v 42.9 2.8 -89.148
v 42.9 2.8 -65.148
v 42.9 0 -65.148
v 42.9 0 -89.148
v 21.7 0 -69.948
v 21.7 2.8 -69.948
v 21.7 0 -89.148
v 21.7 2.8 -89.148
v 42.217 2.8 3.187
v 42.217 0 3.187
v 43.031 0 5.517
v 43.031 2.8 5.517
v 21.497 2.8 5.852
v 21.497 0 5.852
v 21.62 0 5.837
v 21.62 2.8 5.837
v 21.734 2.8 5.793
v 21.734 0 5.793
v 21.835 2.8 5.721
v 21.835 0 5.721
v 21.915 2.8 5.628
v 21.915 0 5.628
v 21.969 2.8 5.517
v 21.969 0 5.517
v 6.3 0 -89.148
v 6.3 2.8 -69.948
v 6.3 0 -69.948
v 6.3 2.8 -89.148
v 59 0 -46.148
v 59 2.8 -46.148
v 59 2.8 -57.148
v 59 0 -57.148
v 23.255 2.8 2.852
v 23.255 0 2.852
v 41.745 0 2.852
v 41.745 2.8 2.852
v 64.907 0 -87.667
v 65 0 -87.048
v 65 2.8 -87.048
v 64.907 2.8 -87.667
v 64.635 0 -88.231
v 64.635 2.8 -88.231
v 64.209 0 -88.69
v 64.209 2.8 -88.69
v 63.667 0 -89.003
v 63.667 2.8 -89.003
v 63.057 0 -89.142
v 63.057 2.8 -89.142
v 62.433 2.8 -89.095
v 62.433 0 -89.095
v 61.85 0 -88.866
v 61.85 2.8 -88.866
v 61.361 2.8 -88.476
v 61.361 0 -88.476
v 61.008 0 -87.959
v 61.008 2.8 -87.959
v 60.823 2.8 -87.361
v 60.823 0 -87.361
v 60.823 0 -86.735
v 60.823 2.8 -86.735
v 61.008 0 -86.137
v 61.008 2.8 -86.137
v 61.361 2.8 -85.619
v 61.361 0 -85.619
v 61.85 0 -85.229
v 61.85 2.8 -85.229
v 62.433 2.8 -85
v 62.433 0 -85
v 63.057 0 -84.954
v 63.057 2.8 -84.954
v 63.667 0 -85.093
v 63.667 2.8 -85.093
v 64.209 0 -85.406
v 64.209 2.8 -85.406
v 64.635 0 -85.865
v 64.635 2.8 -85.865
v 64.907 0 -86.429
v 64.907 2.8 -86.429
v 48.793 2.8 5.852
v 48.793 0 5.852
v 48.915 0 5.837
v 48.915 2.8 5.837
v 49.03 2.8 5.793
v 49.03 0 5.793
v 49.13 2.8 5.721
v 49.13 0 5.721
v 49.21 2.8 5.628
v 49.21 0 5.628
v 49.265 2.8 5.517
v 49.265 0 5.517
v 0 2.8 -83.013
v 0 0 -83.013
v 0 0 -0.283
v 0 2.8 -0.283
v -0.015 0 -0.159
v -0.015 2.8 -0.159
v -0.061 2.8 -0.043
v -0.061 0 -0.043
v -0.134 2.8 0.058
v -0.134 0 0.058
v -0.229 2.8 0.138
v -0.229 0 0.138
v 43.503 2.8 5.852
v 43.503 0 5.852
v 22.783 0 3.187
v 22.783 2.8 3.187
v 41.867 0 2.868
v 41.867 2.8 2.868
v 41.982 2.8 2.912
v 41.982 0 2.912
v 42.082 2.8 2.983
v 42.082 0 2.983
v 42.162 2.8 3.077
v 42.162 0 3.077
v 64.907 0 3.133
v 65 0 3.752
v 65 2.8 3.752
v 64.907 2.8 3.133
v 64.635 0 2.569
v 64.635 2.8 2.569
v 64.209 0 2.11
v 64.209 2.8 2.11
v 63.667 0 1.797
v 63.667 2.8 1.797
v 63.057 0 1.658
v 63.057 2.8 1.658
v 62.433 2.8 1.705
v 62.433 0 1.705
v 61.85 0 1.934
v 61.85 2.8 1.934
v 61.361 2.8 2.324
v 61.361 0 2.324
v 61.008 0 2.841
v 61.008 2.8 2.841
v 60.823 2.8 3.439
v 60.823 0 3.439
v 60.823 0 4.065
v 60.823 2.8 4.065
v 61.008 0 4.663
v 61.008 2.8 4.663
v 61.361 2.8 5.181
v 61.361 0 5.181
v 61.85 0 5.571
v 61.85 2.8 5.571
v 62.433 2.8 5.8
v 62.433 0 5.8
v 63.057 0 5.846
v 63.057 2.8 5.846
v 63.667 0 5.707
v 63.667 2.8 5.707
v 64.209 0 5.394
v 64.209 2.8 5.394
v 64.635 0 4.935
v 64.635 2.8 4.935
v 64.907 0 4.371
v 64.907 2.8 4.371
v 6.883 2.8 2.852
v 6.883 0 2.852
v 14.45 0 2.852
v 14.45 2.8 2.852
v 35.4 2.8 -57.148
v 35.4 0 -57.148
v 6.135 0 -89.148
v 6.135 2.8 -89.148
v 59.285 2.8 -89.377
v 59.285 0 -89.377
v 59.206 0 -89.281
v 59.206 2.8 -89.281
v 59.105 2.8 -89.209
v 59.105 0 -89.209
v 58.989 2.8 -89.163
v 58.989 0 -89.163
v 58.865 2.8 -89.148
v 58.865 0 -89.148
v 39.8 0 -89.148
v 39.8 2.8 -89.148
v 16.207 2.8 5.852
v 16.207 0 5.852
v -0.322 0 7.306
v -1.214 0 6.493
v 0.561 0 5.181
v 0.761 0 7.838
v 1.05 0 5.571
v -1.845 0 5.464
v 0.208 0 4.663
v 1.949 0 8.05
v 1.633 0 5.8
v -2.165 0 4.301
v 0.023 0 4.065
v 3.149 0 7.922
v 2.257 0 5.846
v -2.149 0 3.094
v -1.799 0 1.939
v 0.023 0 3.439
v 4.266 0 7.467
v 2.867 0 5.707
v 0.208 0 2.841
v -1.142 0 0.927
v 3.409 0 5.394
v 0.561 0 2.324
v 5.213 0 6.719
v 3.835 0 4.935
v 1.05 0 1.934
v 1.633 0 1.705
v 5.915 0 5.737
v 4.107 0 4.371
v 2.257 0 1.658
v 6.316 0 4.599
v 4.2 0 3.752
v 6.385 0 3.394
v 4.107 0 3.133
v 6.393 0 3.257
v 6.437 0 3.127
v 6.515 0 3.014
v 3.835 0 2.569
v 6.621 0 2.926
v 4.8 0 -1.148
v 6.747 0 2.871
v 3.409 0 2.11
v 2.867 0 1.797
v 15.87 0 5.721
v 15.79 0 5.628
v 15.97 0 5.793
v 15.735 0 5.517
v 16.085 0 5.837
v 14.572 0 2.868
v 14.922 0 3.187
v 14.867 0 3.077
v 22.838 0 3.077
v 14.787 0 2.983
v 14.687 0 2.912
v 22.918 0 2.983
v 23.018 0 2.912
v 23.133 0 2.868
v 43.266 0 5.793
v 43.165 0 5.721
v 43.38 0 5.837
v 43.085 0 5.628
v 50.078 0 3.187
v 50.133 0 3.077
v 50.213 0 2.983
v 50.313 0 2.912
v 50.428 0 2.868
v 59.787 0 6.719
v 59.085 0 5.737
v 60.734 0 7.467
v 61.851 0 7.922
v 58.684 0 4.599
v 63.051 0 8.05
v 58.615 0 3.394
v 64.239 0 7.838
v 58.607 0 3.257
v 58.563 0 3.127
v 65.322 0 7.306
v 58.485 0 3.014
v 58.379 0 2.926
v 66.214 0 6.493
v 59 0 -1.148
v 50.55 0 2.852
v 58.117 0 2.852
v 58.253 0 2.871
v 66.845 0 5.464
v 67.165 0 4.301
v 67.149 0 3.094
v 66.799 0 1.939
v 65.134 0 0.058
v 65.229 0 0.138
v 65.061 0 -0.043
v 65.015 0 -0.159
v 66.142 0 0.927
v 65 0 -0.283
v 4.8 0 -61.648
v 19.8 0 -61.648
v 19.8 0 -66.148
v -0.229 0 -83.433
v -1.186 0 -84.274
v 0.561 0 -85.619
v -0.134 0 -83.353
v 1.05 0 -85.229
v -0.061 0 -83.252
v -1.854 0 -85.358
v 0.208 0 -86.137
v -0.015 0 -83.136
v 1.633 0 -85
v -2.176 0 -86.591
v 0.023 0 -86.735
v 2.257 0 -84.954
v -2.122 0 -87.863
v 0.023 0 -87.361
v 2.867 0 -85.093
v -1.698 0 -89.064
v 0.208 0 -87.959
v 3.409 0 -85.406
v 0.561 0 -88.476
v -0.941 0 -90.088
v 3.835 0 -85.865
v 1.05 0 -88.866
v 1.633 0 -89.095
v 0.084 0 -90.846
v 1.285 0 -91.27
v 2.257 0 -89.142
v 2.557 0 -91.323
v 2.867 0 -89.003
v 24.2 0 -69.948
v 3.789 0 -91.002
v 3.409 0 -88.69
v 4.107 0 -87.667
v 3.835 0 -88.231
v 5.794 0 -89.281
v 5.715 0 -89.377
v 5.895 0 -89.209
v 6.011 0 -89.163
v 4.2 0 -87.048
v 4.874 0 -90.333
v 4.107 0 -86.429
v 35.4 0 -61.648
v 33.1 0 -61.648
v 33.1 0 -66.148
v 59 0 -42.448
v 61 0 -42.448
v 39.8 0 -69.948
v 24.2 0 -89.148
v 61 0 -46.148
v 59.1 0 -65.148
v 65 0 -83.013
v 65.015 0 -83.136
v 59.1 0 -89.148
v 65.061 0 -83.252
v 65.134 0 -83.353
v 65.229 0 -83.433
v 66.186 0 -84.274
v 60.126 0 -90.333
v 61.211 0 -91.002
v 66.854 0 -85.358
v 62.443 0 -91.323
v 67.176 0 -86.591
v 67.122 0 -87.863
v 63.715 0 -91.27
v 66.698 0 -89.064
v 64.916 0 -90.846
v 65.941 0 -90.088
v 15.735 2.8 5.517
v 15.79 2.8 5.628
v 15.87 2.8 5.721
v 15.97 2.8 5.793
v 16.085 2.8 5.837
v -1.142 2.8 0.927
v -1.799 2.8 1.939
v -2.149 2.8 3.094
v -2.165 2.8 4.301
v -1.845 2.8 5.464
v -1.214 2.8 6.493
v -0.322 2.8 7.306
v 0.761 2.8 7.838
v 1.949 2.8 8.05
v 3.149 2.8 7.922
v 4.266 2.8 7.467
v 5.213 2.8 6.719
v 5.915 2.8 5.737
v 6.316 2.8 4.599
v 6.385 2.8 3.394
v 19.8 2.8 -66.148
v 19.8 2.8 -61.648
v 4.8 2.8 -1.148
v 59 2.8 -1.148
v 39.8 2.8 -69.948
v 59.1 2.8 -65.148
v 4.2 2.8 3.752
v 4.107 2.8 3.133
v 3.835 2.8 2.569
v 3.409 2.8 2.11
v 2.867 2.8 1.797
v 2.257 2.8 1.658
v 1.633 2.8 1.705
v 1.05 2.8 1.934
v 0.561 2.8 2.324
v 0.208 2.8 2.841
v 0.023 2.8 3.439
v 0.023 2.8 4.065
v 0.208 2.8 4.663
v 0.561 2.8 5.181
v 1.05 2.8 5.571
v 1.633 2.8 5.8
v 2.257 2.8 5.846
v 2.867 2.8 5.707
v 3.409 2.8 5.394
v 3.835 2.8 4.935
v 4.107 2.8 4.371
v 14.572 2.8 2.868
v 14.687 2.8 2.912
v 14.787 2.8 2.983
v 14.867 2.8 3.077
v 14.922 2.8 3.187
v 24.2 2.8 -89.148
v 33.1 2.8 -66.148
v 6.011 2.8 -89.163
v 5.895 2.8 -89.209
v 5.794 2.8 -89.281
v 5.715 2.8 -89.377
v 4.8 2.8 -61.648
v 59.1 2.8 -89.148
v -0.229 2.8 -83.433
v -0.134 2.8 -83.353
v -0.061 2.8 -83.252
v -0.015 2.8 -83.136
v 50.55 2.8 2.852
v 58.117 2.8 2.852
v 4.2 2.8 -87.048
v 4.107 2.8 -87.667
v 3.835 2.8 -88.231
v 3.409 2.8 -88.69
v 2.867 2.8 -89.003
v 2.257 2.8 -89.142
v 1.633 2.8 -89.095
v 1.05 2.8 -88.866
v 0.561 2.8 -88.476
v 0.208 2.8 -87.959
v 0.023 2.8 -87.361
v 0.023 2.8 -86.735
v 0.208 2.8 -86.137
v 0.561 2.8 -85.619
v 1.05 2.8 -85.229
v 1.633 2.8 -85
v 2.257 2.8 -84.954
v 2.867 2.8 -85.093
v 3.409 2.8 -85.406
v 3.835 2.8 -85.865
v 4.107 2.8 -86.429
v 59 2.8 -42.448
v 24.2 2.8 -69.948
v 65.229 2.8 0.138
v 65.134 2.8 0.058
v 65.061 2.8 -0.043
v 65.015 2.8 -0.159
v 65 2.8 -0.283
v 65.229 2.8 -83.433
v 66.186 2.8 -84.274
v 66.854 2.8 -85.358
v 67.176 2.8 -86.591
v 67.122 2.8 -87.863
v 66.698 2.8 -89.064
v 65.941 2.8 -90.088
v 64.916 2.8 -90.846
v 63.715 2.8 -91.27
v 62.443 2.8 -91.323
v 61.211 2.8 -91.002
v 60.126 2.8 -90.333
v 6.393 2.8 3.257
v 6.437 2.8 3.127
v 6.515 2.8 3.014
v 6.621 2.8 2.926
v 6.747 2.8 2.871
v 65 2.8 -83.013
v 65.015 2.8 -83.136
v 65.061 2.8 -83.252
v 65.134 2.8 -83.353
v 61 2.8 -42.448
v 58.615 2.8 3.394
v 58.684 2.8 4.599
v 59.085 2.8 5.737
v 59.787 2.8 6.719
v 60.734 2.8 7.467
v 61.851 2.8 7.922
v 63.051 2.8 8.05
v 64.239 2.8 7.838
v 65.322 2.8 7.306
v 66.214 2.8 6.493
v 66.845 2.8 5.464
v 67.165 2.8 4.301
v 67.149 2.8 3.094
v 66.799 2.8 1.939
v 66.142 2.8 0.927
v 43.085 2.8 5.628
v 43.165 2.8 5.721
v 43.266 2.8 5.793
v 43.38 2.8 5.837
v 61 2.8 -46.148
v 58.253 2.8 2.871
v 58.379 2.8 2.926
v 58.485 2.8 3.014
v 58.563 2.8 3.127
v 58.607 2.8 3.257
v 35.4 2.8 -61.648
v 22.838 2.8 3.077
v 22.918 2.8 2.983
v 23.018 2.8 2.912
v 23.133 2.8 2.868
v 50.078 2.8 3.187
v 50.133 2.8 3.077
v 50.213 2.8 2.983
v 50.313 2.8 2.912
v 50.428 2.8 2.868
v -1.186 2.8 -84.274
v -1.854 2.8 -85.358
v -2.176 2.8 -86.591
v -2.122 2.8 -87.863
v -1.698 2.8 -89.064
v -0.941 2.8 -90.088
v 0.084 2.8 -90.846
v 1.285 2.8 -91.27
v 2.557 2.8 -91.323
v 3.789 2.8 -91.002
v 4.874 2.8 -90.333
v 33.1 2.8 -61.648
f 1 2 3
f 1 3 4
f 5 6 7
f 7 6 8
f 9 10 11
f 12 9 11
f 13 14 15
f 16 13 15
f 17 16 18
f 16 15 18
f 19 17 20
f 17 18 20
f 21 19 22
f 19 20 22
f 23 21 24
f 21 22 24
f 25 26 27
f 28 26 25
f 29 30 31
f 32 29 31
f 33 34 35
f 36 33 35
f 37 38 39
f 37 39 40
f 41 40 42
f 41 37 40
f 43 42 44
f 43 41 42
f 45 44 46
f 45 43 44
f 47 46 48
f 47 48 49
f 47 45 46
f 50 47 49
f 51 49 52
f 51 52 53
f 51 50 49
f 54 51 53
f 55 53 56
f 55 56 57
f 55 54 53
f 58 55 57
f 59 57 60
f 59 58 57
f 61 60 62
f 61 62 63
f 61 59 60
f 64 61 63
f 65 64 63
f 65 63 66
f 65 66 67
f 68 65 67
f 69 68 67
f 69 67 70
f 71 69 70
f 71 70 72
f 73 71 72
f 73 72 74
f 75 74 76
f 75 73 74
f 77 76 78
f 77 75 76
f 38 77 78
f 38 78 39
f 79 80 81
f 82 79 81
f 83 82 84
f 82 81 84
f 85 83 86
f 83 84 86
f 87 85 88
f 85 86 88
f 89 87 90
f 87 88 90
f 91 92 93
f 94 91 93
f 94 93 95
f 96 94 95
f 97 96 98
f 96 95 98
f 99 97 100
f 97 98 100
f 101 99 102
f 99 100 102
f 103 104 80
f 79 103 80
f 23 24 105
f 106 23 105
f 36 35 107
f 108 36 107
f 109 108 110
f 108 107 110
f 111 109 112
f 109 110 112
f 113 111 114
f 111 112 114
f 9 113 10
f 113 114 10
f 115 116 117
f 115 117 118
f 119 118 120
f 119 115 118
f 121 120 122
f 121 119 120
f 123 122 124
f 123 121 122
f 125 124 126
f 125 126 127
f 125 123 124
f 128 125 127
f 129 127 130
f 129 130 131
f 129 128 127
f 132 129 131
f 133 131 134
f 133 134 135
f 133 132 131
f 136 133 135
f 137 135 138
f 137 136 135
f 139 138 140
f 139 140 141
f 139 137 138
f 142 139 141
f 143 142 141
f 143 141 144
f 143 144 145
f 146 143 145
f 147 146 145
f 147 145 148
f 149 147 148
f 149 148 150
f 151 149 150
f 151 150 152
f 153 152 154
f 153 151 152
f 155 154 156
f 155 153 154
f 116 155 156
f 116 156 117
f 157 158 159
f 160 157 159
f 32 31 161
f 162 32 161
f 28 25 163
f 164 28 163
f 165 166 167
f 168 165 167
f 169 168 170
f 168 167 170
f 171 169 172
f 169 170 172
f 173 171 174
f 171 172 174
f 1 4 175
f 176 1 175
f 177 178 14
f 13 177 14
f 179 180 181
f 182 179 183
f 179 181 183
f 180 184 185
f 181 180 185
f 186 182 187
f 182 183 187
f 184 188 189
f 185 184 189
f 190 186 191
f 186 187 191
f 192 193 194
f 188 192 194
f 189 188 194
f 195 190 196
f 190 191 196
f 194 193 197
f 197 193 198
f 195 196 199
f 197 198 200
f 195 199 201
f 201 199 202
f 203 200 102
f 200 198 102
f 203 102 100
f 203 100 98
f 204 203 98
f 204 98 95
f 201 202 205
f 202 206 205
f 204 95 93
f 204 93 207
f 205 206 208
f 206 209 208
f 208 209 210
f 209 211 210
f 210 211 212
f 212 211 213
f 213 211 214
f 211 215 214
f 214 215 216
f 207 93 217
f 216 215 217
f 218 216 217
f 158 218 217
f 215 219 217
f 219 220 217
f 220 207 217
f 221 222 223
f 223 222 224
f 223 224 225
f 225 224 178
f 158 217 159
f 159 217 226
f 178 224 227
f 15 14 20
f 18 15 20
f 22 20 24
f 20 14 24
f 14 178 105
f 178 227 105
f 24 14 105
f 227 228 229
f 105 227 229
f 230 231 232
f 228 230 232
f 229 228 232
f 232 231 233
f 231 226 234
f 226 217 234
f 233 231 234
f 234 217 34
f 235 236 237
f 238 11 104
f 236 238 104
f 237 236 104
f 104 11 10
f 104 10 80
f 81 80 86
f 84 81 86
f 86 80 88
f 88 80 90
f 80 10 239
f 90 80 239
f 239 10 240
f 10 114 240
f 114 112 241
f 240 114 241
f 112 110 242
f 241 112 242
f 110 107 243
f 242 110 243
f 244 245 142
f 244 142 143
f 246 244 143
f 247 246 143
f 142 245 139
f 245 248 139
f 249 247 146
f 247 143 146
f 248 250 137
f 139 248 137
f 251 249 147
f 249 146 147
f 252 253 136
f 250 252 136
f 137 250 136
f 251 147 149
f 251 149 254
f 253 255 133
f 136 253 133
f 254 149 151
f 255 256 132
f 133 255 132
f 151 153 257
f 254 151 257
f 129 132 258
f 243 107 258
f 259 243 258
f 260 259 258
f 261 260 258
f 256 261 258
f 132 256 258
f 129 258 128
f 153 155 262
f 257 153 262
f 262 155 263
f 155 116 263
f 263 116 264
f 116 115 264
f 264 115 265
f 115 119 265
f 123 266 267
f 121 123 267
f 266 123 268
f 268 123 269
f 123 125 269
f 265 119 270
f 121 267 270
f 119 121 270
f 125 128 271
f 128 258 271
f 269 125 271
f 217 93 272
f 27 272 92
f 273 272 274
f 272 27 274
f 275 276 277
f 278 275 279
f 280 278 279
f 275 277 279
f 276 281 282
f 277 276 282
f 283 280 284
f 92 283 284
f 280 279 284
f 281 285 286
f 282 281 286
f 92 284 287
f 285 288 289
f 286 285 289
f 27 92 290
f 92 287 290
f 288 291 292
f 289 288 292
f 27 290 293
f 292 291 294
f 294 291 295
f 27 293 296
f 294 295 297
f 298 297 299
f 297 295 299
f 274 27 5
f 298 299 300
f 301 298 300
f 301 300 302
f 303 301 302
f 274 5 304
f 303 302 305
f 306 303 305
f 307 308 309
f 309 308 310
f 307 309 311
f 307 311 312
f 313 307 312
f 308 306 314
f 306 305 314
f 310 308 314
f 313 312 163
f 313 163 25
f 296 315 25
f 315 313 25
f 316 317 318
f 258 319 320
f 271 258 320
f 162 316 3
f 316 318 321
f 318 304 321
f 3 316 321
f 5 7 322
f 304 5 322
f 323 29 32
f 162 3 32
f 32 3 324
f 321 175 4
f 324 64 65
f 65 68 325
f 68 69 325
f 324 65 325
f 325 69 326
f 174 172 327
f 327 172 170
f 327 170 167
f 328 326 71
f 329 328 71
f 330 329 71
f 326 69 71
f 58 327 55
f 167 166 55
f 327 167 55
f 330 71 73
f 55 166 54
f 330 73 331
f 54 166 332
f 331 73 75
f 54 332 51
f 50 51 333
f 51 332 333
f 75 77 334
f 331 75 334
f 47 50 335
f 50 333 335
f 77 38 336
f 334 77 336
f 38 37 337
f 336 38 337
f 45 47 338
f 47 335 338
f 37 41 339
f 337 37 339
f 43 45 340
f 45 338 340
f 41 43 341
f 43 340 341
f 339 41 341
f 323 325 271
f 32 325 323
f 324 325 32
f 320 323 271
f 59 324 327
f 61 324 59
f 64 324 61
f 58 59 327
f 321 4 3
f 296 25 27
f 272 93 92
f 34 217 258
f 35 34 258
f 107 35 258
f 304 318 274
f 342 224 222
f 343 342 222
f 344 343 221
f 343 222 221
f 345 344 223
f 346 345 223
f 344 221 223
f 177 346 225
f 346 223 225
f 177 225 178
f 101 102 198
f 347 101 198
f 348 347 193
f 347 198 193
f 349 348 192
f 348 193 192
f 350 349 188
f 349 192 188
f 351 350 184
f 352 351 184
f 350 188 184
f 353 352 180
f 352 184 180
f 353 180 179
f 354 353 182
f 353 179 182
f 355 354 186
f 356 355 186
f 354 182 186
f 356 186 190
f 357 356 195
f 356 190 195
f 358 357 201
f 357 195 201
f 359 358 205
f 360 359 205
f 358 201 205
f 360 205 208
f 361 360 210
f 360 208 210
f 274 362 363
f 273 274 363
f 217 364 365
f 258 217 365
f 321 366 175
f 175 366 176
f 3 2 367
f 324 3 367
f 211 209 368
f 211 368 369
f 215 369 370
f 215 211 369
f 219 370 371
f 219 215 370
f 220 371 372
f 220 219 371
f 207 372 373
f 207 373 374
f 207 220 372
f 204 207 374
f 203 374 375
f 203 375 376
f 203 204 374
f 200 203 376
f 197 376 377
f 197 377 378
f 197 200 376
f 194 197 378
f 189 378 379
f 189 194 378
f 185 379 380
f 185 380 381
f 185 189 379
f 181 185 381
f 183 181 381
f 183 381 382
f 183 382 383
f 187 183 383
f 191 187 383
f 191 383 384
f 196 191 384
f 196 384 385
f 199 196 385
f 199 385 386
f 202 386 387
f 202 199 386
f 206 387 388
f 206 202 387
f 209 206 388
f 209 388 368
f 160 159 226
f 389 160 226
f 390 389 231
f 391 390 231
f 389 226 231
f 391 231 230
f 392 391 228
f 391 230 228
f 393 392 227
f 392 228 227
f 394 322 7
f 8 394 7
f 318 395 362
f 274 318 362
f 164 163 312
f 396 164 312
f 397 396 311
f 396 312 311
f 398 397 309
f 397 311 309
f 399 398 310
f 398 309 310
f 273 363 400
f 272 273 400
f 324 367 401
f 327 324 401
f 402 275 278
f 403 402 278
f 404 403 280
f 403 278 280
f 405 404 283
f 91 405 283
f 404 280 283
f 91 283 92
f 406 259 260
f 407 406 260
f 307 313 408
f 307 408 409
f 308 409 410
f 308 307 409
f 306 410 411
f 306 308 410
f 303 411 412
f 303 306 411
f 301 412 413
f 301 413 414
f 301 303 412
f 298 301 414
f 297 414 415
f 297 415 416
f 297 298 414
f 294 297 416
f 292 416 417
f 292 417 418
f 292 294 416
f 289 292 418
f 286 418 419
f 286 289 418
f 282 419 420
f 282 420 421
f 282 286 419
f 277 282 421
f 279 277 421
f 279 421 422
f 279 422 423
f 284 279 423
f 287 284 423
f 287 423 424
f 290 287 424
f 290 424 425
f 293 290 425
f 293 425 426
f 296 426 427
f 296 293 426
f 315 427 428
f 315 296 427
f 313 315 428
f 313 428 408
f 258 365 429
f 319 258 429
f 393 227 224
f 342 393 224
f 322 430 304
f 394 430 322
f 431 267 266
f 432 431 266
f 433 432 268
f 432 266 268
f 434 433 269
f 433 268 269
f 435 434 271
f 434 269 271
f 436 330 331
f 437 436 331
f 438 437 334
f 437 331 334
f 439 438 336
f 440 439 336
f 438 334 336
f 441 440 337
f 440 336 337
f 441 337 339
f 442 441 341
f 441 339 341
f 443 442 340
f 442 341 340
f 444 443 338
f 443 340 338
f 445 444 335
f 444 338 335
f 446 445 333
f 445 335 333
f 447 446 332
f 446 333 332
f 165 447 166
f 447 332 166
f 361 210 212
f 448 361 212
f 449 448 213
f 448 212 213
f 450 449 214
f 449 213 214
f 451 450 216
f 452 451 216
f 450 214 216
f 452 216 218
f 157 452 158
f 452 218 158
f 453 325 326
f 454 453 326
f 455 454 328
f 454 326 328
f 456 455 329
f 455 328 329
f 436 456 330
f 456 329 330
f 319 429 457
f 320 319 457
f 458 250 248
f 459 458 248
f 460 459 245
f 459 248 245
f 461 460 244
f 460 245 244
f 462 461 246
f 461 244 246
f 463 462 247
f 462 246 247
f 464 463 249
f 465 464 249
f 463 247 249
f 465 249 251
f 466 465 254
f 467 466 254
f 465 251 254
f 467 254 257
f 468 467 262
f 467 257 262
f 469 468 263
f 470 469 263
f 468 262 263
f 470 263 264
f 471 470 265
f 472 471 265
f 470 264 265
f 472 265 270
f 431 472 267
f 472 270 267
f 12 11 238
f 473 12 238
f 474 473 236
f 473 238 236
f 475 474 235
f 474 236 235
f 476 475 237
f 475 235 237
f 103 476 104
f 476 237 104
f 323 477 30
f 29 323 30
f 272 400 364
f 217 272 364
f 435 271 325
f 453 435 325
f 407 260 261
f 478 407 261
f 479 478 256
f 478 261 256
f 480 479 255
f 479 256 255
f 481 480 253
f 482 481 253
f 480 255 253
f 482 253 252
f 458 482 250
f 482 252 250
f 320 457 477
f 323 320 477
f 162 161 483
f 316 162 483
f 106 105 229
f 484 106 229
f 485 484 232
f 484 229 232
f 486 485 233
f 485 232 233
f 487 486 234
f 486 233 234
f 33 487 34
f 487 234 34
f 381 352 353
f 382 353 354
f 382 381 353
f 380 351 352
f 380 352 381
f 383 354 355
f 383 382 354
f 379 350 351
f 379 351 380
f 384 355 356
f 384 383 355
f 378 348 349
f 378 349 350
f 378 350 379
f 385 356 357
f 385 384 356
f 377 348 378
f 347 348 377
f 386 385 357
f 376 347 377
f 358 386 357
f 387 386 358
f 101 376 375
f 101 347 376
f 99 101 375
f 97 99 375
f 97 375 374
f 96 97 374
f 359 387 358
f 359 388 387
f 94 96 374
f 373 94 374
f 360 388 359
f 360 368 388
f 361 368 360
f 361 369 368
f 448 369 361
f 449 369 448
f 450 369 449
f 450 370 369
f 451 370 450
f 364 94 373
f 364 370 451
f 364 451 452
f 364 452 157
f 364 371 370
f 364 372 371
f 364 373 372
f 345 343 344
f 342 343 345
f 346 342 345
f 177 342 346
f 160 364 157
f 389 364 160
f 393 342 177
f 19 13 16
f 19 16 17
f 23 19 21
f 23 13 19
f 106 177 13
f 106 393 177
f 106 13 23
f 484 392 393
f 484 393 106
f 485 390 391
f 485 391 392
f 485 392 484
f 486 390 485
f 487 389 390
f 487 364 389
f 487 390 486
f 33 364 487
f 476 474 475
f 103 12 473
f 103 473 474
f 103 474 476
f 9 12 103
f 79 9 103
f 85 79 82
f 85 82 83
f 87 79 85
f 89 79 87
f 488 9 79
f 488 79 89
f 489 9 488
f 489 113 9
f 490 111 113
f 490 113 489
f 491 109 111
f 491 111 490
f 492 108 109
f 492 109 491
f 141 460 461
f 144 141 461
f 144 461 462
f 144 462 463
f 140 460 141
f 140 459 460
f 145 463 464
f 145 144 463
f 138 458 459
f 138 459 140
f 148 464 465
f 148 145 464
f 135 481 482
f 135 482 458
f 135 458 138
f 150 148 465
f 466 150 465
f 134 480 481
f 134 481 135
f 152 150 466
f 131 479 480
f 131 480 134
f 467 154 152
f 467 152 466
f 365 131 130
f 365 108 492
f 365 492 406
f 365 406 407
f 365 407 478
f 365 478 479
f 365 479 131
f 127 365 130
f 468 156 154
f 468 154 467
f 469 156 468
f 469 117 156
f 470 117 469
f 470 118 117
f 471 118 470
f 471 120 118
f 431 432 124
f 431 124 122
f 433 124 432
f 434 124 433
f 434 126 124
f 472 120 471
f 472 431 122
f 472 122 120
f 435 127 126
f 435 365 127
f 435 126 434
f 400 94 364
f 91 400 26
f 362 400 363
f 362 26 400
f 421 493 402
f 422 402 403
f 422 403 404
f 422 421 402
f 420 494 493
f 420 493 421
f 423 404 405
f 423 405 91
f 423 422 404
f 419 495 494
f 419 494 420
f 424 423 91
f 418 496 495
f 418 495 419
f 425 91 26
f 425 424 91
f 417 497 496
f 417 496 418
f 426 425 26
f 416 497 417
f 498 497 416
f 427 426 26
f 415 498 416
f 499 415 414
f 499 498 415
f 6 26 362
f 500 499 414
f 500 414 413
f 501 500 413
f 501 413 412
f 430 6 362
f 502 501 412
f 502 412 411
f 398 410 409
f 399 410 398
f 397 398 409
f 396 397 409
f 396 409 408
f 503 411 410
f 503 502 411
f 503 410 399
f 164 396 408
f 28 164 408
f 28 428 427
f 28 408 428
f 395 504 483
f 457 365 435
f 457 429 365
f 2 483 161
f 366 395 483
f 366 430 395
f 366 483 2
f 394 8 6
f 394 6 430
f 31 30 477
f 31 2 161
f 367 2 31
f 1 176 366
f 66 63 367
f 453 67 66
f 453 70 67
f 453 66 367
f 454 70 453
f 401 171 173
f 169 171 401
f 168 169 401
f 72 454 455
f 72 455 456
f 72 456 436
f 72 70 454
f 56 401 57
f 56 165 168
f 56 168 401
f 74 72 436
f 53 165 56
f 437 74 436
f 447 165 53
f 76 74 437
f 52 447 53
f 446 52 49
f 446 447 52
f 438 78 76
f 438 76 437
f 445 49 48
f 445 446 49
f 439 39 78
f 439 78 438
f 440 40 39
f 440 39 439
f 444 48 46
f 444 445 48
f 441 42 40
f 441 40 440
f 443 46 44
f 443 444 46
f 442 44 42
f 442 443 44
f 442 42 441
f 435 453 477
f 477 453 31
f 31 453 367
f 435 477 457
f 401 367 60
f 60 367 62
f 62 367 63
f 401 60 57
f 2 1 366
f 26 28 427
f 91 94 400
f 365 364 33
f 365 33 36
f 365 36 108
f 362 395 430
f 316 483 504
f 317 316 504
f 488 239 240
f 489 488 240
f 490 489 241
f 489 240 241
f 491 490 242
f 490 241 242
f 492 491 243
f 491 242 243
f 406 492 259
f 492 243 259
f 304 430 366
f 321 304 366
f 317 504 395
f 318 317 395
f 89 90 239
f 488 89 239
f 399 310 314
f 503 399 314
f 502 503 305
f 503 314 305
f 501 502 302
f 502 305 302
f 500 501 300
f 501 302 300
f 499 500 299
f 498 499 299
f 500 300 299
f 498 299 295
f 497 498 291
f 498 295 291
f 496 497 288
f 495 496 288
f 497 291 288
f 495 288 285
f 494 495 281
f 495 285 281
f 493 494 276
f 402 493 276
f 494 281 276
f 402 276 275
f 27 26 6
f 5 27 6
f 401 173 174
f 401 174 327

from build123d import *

# Parameters (mm, degrees)
BASEPLATE_OUTLINE_R = 2.1
BASEPLATE_DEPTH     = 2.8
CUT_EXTRUDE1_REACH  = 115.438
SKETCH3_W           = 15.4
SKETCH3_H           = 19.2
SKETCH3_W_2         = 15.6
SKETCH3_W_3         = 16.2
SKETCH3_H_2         = 24


# Read off the part's stored shape, not the designer's step: BasePlate
with BuildPart() as part:
    # BasePlate outline → BasePlate (new body)
    with BuildSketch(Plane(origin=(0, 0, 0), x_dir=(1, 0, 0), z_dir=(0, 1, 0))):
        with BuildLine():
            Line((43.502626614, -5.852332608), (48.792614178, -5.852332608))
            ThreePointArc((48.792614178, -5.852332608), (49.082078508, -5.760021707), (49.264659986, -5.517174213))
            Line((49.264659986, -5.517174213), (50.078201202, -3.187491002))
            ThreePointArc((50.078201202, -3.187491002), (50.26078268, -2.944643509), (50.55024701, -2.852332608))
            Line((50.55024701, -2.852332608), (58.116695703, -2.852332608))
            ThreePointArc((58.116695703, -2.852332608), (58.484685739, -3.013831008), (58.614956567, -3.393999275))
            ThreePointArc((58.614956567, -3.393999275), (64.799237397, -7.61016844), (65.229166667, -0.137781095))
            ThreePointArc((65.229166667, -0.137781095), (65.061014427, 0.043158816), (65, 0.282515593))
            Line((65, 0.282515593), (65, 83.012819192))
            ThreePointArc((65, 83.012819192), (65.061014427, 83.252175969), (65.229166667, 83.433115879))
            ThreePointArc((65.229166667, 83.433115879), (65.940559159, 90.088226551), (59.285448487, 89.376834059))
            ThreePointArc((59.285448487, 89.376834059), (59.104508577, 89.208681819), (58.8651518, 89.147667392))
            Line((58.8651518, 89.147667392), (6.1348482, 89.147667392))
            ThreePointArc((6.1348482, 89.147667392), (5.895491423, 89.208681819), (5.714551513, 89.376834059))
            ThreePointArc((5.714551513, 89.376834059), (-0.940559159, 90.088226551), (-0.229166667, 83.433115879))
            ThreePointArc((-0.229166667, 83.433115879), (-0.061014427, 83.252175969), (0, 83.012819192))
            Line((0, 83.012819192), (0, 0.282515593))
            ThreePointArc((0, 0.282515593), (-0.061014427, 0.043158816), (-0.229166667, -0.137781095))
            ThreePointArc((-0.229166667, -0.137781095), (0.200762603, -7.61016844), (6.385043433, -3.393999275))
            ThreePointArc((6.385043433, -3.393999275), (6.515314261, -3.013831008), (6.883304297, -2.852332608))
            Line((6.883304297, -2.852332608), (14.44975299, -2.852332608))
            ThreePointArc((14.44975299, -2.852332608), (14.73921732, -2.944643509), (14.921798798, -3.187491002))
            Line((14.921798798, -3.187491002), (15.735340014, -5.517174213))
            ThreePointArc((15.735340014, -5.517174213), (15.917921492, -5.760021707), (16.207385822, -5.852332608))
            Line((16.207385822, -5.852332608), (21.497373386, -5.852332608))
            ThreePointArc((21.497373386, -5.852332608), (21.786837716, -5.760021707), (21.969419194, -5.517174213))
            Line((21.969419194, -5.517174213), (22.78296041, -3.187491002))
            ThreePointArc((22.78296041, -3.187491002), (22.965541888, -2.944643509), (23.255006218, -2.852332608))
            Line((23.255006218, -2.852332608), (41.744993782, -2.852332608))
            ThreePointArc((41.744993782, -2.852332608), (42.034458112, -2.944643509), (42.21703959, -3.187491002))
            Line((42.21703959, -3.187491002), (43.030580806, -5.517174213))
            ThreePointArc((43.030580806, -5.517174213), (43.213162284, -5.760021707), (43.502626614, -5.852332608))
        make_face()
        with Locations((2.1, -3.752332608)):
            Circle(BASEPLATE_OUTLINE_R, mode=Mode.SUBTRACT)
        with Locations((62.9, -3.752332608)):
            Circle(BASEPLATE_OUTLINE_R, mode=Mode.SUBTRACT)
        with Locations((2.1, 87.047667392)):
            Circle(BASEPLATE_OUTLINE_R, mode=Mode.SUBTRACT)
        with Locations((62.9, 87.047667392)):
            Circle(BASEPLATE_OUTLINE_R, mode=Mode.SUBTRACT)
    extrude(amount=BASEPLATE_DEPTH)

    # Sketch3 → Cut-Extrude1 (cut, up to next)
    with BuildSketch(Plane(origin=(0, 2.8, 0), x_dir=(1, 0, 0), z_dir=(0, 1, 0)), mode=Mode.PRIVATE) as cut_extrude1_sk1:
        Polygon((4.8, 1.147667392), (59, 1.147667392), (59, 42.447667392), (61, 42.447667392), (61, 46.147667392), (59, 46.147667392), (59, 57.147667392), (35.4, 57.147667392), (35.4, 61.647667392), (33.1, 61.647667392), (33.1, 66.147667392), (19.8, 66.147667392), (19.8, 61.647667392), (4.8, 61.647667392), align=None)
    cut_extrude1_tool1 = extrude(cut_extrude1_sk1.sketch, amount=-CUT_EXTRUDE1_REACH, mode=Mode.PRIVATE) & part.part
    # Sketch3 → Cut-Extrude1 (cut, up to next)
    with BuildSketch(Plane(origin=(0, 2.8, 0), x_dir=(1, 0, 0), z_dir=(0, 1, 0)), mode=Mode.PRIVATE) as cut_extrude1_sk2:
        with Locations((14, 79.547667392)):
            Rectangle(SKETCH3_W, SKETCH3_H)
    cut_extrude1_tool2 = extrude(cut_extrude1_sk2.sketch, amount=-CUT_EXTRUDE1_REACH, mode=Mode.PRIVATE) & part.part
    # Sketch3 → Cut-Extrude1 (cut, up to next)
    with BuildSketch(Plane(origin=(0, 2.8, 0), x_dir=(1, 0, 0), z_dir=(0, 1, 0)), mode=Mode.PRIVATE) as cut_extrude1_sk3:
        with Locations((32, 79.547667392)):
            Rectangle(SKETCH3_W_2, SKETCH3_H)
    cut_extrude1_tool3 = extrude(cut_extrude1_sk3.sketch, amount=-CUT_EXTRUDE1_REACH, mode=Mode.PRIVATE) & part.part
    # Sketch3 → Cut-Extrude1 (cut, up to next)
    with BuildSketch(Plane(origin=(0, 2.8, 0), x_dir=(1, 0, 0), z_dir=(0, 1, 0)), mode=Mode.PRIVATE) as cut_extrude1_sk4:
        with Locations((51, 77.147667392)):
            Rectangle(SKETCH3_W_3, SKETCH3_H_2)
    cut_extrude1_tool4 = extrude(cut_extrude1_sk4.sketch, amount=-CUT_EXTRUDE1_REACH, mode=Mode.PRIVATE) & part.part
    add(cut_extrude1_tool1.solids().sort_by_distance((31.36203, 2.8, -31.109713))[0], mode=Mode.SUBTRACT)
    add(cut_extrude1_tool2.solids().sort_by_distance((14, 2.8, -79.547667))[0], mode=Mode.SUBTRACT)
    add(cut_extrude1_tool3.solids().sort_by_distance((32, 2.8, -79.547667))[0], mode=Mode.SUBTRACT)
    add(cut_extrude1_tool4.solids().sort_by_distance((51, 2.8, -77.147667))[0], mode=Mode.SUBTRACT)


solid = part.part
